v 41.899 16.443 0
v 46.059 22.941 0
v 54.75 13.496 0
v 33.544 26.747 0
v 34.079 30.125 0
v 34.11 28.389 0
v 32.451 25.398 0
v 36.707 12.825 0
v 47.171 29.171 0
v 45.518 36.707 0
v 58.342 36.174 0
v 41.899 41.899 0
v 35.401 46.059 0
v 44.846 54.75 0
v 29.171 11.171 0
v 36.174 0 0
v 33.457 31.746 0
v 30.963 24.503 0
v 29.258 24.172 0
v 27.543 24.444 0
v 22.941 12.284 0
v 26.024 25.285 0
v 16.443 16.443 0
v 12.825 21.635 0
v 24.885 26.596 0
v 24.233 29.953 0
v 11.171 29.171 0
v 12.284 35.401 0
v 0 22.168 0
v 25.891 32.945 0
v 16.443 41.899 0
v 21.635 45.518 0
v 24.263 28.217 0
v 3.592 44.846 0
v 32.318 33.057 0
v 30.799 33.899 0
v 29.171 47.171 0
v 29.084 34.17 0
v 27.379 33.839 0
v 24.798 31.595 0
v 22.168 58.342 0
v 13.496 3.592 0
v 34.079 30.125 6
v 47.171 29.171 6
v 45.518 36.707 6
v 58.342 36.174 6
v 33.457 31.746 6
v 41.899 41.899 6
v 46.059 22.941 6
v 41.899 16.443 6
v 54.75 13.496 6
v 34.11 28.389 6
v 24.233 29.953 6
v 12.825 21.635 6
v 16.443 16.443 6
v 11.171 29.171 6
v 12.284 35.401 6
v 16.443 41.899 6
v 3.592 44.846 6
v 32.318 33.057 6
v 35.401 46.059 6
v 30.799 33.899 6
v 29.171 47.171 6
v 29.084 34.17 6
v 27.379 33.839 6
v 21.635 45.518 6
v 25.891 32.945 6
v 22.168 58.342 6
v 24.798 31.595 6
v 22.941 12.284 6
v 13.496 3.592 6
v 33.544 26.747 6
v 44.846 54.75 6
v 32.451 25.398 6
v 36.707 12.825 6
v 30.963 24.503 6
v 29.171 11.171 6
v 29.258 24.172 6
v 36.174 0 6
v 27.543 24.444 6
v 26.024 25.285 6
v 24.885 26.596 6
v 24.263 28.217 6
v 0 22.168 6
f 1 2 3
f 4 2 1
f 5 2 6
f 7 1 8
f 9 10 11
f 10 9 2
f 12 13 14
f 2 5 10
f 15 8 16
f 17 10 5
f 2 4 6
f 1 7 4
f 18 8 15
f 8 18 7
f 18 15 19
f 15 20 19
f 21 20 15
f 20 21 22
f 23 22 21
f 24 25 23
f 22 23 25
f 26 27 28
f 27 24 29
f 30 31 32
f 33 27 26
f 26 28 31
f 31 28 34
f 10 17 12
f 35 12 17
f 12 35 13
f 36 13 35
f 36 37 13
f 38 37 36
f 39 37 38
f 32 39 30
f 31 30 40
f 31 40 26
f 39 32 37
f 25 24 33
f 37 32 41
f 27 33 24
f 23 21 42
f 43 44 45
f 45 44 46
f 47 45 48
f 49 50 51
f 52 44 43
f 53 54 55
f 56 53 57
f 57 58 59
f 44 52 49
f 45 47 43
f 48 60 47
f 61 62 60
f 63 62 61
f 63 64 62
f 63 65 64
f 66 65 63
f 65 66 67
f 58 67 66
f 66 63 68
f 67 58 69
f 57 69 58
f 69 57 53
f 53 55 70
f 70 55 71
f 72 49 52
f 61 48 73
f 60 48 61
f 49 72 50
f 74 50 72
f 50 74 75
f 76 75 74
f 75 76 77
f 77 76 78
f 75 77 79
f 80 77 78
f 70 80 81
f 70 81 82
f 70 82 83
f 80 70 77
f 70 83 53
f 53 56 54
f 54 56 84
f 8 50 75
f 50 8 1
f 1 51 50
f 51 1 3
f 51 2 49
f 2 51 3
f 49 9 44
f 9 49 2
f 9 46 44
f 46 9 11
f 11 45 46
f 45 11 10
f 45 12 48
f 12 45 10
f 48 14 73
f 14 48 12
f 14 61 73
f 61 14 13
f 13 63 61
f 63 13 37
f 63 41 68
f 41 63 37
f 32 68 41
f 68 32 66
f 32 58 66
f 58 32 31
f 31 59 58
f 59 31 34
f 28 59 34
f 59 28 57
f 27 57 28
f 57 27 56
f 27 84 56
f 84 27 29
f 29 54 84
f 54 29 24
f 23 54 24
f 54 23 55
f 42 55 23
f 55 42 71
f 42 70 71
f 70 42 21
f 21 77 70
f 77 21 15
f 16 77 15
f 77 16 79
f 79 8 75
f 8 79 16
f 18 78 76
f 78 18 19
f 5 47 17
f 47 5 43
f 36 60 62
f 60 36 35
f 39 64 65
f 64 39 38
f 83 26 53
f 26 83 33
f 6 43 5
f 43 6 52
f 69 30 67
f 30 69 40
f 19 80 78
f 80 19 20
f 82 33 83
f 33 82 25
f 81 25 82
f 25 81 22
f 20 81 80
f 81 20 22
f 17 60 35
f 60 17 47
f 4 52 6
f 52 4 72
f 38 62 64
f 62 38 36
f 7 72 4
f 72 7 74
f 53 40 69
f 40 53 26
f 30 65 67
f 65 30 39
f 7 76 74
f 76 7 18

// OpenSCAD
$fn = 32;

// ----------------------------------------------------------------------
// Star wheel: 8-point ratchet, R30
// ----------------------------------------------------------------------

// --- parameters (mm) ---
n_points = 8;             // number of points / teeth
r_out = 30;               // tip radius
r_in = 18;                // root radius
bore_r = 5;               // centre bore radius
plate_t = 6;              // plate thickness, Z (extrusion height)
bore_d = 10;              // centre bore diameter

profile = [[29.171, 47.171], [22.168, 58.342], [21.635, 45.518], [16.443, 41.899], [3.592, 44.846], [12.284, 35.401], [11.171, 29.171], [0, 22.168], [12.825, 21.635], [16.443, 16.443], [13.496, 3.592], [22.941, 12.284], [29.171, 11.171], [36.174, 0], [36.707, 12.825], [41.899, 16.443], [54.75, 13.496], [46.059, 22.941], [47.171, 29.171], [58.342, 36.174], [45.518, 36.707], [41.899, 41.899], [44.846, 54.75], [35.401, 46.059]];  // primary outline, 24 points, counter clockwise
void_1 = [[34.079, 30.125], [33.457, 31.746], [32.318, 33.057], [30.799, 33.899], [29.084, 34.17], [27.379, 33.839], [25.891, 32.945], [24.798, 31.595], [24.233, 29.953], [24.263, 28.217], [24.885, 26.596], [26.024, 25.285], [27.543, 24.444], [29.258, 24.172], [30.963, 24.503], [32.451, 25.398], [33.544, 26.747], [34.11, 28.389]];  // centre bore, 18 points

// --- the one profile operation ---
difference() {
  linear_extrude(height = plate_t) polygon(points = profile);
  translate([0, 0, -1])
    linear_extrude(height = plate_t + 2) polygon(points = void_1);
}
